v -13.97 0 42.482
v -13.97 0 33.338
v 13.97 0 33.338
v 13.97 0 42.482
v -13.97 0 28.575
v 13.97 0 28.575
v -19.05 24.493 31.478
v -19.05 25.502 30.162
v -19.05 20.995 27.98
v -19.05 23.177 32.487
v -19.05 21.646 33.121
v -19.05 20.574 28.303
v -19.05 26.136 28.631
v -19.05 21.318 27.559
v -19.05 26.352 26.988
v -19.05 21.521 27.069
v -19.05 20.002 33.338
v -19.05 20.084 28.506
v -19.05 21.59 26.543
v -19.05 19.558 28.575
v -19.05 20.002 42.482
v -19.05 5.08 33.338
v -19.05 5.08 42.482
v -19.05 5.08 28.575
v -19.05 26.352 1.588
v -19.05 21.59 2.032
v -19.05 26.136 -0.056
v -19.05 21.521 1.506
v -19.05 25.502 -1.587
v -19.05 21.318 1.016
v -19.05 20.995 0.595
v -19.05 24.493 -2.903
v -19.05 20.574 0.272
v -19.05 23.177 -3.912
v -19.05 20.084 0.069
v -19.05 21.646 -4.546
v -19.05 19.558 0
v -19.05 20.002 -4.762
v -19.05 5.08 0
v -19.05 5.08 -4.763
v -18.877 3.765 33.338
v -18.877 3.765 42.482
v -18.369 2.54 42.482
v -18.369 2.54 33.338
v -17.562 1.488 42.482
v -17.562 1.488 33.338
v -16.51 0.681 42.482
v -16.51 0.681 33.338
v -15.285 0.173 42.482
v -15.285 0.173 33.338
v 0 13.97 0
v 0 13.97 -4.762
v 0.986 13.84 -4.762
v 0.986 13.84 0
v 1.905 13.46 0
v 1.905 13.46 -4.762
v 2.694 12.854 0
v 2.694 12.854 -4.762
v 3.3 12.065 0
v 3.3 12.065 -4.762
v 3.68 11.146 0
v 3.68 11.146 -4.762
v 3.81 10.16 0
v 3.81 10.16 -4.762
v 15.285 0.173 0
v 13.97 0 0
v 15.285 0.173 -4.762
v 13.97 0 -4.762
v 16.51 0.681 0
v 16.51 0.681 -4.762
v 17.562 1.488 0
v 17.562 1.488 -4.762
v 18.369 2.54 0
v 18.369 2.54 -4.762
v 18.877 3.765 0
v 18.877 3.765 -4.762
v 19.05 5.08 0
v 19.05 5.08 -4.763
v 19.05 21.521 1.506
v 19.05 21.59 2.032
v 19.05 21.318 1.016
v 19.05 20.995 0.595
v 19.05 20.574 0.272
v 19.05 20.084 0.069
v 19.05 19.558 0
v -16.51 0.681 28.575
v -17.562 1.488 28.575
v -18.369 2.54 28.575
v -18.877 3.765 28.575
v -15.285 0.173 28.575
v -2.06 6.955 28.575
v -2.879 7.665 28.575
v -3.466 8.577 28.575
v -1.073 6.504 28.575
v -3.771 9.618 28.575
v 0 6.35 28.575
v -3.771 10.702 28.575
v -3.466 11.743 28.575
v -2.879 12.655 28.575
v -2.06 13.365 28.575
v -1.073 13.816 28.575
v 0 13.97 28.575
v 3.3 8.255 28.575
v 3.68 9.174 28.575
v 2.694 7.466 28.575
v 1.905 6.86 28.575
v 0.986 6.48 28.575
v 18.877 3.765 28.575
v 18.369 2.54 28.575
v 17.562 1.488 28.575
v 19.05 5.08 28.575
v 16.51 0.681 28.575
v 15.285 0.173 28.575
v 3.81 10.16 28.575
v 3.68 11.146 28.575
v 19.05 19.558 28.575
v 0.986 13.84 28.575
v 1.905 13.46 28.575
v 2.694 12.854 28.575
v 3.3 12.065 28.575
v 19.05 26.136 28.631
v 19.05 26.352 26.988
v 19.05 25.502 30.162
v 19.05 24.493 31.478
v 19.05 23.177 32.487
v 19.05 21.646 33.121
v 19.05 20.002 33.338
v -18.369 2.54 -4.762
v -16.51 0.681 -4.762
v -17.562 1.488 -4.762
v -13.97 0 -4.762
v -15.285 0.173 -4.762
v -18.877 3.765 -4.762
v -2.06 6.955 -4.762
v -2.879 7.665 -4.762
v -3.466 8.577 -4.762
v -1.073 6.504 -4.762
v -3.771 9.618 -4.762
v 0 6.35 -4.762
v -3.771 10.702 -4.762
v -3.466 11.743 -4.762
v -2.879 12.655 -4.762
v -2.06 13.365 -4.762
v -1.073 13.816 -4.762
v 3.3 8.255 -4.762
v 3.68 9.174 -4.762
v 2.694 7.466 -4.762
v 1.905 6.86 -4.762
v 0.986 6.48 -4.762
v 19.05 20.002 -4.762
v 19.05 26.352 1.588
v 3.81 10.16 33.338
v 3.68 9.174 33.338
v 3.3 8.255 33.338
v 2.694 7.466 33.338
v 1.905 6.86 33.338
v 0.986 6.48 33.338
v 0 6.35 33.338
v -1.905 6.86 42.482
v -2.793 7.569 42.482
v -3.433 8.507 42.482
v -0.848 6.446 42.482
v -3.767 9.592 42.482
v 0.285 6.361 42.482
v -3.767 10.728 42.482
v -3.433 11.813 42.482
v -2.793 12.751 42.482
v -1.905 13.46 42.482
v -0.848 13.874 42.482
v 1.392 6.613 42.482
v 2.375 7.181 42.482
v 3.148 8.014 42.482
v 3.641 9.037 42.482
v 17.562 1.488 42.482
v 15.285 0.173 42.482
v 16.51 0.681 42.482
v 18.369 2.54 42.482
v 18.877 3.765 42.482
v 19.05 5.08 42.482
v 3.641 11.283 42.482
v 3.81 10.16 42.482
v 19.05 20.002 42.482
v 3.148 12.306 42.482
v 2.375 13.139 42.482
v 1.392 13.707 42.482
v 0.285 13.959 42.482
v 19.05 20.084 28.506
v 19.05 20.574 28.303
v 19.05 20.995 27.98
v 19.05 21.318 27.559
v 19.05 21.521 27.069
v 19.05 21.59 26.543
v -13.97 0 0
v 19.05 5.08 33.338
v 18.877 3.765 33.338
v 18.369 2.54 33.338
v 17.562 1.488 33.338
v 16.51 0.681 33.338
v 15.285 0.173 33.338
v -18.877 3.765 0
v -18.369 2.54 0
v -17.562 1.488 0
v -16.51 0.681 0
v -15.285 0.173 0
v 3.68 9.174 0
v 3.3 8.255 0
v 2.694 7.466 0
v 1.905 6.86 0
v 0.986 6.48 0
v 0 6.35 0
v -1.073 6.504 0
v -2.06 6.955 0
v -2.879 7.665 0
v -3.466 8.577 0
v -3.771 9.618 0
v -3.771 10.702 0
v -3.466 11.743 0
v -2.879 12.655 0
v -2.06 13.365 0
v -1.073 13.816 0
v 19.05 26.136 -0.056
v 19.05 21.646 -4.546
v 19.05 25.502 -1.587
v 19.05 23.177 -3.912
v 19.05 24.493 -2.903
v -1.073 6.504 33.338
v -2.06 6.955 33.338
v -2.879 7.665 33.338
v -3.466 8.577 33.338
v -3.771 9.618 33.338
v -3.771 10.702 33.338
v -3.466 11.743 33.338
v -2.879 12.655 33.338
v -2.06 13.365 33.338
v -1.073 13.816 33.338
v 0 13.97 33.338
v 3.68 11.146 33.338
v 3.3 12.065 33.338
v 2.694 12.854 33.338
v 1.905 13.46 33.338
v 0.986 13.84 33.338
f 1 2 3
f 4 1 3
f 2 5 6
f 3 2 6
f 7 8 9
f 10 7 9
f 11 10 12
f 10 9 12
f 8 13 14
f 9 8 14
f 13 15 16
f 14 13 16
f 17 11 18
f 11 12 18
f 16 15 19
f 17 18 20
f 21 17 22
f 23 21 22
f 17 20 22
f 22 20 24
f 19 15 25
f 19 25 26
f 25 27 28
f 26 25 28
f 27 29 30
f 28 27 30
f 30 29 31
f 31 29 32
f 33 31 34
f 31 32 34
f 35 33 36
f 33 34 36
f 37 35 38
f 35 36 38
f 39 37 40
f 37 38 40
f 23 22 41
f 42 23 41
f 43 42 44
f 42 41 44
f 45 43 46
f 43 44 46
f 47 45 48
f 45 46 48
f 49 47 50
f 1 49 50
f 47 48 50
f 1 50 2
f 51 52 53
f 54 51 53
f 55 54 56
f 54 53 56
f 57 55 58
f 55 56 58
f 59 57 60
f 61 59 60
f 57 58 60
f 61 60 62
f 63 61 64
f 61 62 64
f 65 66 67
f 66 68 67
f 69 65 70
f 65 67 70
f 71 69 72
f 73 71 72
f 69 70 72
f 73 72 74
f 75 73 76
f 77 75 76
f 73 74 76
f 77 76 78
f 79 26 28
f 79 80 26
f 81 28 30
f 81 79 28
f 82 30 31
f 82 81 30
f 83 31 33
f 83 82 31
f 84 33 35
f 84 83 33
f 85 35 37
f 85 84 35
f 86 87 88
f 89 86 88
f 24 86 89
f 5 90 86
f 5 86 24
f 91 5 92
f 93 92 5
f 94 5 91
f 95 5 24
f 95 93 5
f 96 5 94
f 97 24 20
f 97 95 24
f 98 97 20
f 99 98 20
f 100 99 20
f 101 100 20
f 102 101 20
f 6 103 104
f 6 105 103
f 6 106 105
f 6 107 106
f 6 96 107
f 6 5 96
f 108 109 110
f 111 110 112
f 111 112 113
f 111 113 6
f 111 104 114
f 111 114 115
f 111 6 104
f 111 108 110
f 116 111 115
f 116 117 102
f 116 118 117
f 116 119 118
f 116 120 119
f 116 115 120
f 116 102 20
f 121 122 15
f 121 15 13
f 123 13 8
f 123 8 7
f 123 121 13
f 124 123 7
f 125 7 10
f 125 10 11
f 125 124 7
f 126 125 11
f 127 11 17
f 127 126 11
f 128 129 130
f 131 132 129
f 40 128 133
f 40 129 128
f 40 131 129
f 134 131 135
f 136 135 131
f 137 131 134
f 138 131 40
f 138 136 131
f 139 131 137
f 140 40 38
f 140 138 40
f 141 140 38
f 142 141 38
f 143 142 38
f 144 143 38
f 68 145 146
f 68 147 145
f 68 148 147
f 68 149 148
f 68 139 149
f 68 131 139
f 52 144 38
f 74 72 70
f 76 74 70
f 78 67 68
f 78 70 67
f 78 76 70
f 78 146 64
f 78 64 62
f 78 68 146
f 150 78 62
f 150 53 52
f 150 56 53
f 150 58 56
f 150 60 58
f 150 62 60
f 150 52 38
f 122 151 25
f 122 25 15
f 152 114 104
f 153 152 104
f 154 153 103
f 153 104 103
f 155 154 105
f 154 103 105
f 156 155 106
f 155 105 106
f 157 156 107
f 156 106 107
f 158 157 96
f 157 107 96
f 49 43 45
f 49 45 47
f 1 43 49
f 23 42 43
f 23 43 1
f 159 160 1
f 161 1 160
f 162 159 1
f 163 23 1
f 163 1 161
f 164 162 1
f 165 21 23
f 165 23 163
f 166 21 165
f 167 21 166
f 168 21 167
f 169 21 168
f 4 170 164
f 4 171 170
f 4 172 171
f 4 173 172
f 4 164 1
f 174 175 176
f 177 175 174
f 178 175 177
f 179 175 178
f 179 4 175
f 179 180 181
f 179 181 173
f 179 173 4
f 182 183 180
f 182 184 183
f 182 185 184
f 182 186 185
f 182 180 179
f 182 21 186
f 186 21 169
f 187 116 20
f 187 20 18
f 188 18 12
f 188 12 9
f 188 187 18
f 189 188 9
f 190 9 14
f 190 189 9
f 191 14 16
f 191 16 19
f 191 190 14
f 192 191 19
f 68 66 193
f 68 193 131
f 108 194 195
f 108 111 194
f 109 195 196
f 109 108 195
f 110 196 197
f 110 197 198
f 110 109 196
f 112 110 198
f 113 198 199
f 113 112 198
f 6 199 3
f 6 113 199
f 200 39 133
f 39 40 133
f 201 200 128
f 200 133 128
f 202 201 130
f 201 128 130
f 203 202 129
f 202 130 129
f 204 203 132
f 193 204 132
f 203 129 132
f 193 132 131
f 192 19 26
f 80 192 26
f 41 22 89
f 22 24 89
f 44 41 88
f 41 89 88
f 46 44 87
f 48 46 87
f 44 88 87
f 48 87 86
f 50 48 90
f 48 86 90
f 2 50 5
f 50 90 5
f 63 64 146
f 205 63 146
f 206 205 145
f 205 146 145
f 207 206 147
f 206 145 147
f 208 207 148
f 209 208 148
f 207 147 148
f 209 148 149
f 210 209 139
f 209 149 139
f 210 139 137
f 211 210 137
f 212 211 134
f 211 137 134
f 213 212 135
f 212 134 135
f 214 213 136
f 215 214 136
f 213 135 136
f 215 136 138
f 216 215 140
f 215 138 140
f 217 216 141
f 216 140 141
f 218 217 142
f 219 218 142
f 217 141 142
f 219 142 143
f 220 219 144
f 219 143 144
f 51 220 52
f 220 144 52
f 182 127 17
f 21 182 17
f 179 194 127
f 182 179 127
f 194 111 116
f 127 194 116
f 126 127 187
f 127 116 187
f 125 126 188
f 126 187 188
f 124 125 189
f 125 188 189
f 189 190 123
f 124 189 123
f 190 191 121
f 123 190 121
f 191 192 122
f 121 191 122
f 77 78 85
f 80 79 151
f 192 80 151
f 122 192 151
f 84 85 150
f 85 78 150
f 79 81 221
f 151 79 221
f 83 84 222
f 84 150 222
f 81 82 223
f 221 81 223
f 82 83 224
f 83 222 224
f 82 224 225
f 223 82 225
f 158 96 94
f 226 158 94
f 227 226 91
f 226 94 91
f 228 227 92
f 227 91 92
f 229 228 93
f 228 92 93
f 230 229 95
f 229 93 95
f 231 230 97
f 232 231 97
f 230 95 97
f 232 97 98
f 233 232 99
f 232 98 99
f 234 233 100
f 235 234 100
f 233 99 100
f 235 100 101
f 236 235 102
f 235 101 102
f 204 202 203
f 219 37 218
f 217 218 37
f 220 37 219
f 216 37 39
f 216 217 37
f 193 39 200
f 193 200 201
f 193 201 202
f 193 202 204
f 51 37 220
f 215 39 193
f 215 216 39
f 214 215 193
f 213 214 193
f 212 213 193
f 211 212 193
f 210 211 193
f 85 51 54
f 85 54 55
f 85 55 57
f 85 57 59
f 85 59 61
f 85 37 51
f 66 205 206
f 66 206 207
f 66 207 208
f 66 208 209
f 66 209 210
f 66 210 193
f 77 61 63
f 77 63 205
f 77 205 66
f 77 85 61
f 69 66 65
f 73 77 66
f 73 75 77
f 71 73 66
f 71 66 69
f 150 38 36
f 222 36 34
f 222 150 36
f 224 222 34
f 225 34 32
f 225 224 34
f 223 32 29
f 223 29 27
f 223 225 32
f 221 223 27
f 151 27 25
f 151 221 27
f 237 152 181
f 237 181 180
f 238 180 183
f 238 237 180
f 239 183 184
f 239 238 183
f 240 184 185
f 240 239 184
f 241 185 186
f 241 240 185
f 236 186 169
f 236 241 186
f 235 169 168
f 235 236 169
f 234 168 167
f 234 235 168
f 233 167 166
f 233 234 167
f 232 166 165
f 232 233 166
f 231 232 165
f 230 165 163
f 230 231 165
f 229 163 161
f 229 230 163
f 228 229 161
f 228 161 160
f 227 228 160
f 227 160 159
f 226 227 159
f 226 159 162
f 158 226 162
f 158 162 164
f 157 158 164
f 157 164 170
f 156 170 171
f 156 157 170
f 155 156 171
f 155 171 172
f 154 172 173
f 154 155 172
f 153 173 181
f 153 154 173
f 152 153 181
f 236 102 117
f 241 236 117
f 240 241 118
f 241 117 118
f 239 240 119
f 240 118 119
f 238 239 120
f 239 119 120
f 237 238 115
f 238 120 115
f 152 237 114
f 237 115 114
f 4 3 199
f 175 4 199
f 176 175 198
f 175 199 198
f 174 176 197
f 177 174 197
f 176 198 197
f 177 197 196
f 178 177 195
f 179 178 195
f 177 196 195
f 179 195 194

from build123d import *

# Parameters (mm, degrees)
F1_DEPTH = 19.05
F3_DEPTH = 70.5358
F4_R     = 5.08
F5_R     = 3.81
F6_DEPTH = 9.144


with BuildPart() as f1:
    # F0 (on Right) → F1 (new body, symmetric)
    with BuildSketch(Plane.YZ):
        with BuildLine():
            Line((19.558, 0), (0, 0))
            Line((0, 0), (0, -4.7625))
            Line((0, -4.7625), (20.0025, -4.7625))
            ThreePointArc((20.0025, -4.7625), (24.492628, -2.902628), (26.3525, 1.5875))
            Line((26.3525, 1.5875), (26.3525, 26.9875))
            ThreePointArc((26.3525, 26.9875), (24.492628, 31.477628), (20.0025, 33.3375))
            Line((20.0025, 33.3375), (0, 33.3375))
            Line((0, 33.3375), (0, 28.575))
            Line((0, 28.575), (19.558, 28.575))
            ThreePointArc((19.558, 28.575), (20.994841, 27.979841), (21.59, 26.543))
            Line((21.59, 26.543), (21.59, 2.032))
            ThreePointArc((21.59, 2.032), (20.994841, 0.595159), (19.558, 0))
        make_face()
    extrude(amount=F1_DEPTH, both=True)

    # F2 (on face) → F3 (cut)
    with BuildSketch(Plane(origin=(0, 0, -4.7625), x_dir=(1, 0, 0), z_dir=(0, 0, -1))):
        with BuildLine():
            ThreePointArc((3.81, -10.16), (2.694077, -7.465923), (0, -6.35))
            Line((0, -6.35), (0, -13.97))
            ThreePointArc((0, -13.97), (2.694077, -12.854077), (3.81, -10.16))
        make_face()
        with BuildLine():
            Line((0, -13.97), (0, -6.35))
            ThreePointArc((0, -6.35), (-3.81, -10.16), (0, -13.97))
        make_face()
    extrude(amount=-F3_DEPTH, mode=Mode.SUBTRACT)

    # F4
    f4_edges = [f1.edges().sort_by_distance(p)[0] for p in [
        (-19.05, 0, 30.95625),
        (19.05, 0, 30.95625),
        (19.05, 0, -2.38125),
        (-19.05, 0, -2.38125),
    ]]
    fillet(f4_edges, radius=F4_R)

    # F5 (on face) → F6 (join)
    with BuildSketch(Plane.XY.offset(33.3375)):
        with BuildLine():
            Line((19.05, 20.0025), (-19.05, 20.0025))
            Line((-19.05, 20.0025), (-19.05, 5.08))
            ThreePointArc((-19.05, 5.08), (-17.562102, 1.487898), (-13.97, 0))
            Line((-13.97, 0), (13.97, 0))
            ThreePointArc((13.97, 0), (17.562102, 1.487898), (19.05, 5.08))
            Line((19.05, 5.08), (19.05, 20.0025))
        make_face()
        with Locations((0, 10.16)):
            Circle(F5_R, mode=Mode.SUBTRACT)
    extrude(amount=F6_DEPTH)


solid = f1.part
